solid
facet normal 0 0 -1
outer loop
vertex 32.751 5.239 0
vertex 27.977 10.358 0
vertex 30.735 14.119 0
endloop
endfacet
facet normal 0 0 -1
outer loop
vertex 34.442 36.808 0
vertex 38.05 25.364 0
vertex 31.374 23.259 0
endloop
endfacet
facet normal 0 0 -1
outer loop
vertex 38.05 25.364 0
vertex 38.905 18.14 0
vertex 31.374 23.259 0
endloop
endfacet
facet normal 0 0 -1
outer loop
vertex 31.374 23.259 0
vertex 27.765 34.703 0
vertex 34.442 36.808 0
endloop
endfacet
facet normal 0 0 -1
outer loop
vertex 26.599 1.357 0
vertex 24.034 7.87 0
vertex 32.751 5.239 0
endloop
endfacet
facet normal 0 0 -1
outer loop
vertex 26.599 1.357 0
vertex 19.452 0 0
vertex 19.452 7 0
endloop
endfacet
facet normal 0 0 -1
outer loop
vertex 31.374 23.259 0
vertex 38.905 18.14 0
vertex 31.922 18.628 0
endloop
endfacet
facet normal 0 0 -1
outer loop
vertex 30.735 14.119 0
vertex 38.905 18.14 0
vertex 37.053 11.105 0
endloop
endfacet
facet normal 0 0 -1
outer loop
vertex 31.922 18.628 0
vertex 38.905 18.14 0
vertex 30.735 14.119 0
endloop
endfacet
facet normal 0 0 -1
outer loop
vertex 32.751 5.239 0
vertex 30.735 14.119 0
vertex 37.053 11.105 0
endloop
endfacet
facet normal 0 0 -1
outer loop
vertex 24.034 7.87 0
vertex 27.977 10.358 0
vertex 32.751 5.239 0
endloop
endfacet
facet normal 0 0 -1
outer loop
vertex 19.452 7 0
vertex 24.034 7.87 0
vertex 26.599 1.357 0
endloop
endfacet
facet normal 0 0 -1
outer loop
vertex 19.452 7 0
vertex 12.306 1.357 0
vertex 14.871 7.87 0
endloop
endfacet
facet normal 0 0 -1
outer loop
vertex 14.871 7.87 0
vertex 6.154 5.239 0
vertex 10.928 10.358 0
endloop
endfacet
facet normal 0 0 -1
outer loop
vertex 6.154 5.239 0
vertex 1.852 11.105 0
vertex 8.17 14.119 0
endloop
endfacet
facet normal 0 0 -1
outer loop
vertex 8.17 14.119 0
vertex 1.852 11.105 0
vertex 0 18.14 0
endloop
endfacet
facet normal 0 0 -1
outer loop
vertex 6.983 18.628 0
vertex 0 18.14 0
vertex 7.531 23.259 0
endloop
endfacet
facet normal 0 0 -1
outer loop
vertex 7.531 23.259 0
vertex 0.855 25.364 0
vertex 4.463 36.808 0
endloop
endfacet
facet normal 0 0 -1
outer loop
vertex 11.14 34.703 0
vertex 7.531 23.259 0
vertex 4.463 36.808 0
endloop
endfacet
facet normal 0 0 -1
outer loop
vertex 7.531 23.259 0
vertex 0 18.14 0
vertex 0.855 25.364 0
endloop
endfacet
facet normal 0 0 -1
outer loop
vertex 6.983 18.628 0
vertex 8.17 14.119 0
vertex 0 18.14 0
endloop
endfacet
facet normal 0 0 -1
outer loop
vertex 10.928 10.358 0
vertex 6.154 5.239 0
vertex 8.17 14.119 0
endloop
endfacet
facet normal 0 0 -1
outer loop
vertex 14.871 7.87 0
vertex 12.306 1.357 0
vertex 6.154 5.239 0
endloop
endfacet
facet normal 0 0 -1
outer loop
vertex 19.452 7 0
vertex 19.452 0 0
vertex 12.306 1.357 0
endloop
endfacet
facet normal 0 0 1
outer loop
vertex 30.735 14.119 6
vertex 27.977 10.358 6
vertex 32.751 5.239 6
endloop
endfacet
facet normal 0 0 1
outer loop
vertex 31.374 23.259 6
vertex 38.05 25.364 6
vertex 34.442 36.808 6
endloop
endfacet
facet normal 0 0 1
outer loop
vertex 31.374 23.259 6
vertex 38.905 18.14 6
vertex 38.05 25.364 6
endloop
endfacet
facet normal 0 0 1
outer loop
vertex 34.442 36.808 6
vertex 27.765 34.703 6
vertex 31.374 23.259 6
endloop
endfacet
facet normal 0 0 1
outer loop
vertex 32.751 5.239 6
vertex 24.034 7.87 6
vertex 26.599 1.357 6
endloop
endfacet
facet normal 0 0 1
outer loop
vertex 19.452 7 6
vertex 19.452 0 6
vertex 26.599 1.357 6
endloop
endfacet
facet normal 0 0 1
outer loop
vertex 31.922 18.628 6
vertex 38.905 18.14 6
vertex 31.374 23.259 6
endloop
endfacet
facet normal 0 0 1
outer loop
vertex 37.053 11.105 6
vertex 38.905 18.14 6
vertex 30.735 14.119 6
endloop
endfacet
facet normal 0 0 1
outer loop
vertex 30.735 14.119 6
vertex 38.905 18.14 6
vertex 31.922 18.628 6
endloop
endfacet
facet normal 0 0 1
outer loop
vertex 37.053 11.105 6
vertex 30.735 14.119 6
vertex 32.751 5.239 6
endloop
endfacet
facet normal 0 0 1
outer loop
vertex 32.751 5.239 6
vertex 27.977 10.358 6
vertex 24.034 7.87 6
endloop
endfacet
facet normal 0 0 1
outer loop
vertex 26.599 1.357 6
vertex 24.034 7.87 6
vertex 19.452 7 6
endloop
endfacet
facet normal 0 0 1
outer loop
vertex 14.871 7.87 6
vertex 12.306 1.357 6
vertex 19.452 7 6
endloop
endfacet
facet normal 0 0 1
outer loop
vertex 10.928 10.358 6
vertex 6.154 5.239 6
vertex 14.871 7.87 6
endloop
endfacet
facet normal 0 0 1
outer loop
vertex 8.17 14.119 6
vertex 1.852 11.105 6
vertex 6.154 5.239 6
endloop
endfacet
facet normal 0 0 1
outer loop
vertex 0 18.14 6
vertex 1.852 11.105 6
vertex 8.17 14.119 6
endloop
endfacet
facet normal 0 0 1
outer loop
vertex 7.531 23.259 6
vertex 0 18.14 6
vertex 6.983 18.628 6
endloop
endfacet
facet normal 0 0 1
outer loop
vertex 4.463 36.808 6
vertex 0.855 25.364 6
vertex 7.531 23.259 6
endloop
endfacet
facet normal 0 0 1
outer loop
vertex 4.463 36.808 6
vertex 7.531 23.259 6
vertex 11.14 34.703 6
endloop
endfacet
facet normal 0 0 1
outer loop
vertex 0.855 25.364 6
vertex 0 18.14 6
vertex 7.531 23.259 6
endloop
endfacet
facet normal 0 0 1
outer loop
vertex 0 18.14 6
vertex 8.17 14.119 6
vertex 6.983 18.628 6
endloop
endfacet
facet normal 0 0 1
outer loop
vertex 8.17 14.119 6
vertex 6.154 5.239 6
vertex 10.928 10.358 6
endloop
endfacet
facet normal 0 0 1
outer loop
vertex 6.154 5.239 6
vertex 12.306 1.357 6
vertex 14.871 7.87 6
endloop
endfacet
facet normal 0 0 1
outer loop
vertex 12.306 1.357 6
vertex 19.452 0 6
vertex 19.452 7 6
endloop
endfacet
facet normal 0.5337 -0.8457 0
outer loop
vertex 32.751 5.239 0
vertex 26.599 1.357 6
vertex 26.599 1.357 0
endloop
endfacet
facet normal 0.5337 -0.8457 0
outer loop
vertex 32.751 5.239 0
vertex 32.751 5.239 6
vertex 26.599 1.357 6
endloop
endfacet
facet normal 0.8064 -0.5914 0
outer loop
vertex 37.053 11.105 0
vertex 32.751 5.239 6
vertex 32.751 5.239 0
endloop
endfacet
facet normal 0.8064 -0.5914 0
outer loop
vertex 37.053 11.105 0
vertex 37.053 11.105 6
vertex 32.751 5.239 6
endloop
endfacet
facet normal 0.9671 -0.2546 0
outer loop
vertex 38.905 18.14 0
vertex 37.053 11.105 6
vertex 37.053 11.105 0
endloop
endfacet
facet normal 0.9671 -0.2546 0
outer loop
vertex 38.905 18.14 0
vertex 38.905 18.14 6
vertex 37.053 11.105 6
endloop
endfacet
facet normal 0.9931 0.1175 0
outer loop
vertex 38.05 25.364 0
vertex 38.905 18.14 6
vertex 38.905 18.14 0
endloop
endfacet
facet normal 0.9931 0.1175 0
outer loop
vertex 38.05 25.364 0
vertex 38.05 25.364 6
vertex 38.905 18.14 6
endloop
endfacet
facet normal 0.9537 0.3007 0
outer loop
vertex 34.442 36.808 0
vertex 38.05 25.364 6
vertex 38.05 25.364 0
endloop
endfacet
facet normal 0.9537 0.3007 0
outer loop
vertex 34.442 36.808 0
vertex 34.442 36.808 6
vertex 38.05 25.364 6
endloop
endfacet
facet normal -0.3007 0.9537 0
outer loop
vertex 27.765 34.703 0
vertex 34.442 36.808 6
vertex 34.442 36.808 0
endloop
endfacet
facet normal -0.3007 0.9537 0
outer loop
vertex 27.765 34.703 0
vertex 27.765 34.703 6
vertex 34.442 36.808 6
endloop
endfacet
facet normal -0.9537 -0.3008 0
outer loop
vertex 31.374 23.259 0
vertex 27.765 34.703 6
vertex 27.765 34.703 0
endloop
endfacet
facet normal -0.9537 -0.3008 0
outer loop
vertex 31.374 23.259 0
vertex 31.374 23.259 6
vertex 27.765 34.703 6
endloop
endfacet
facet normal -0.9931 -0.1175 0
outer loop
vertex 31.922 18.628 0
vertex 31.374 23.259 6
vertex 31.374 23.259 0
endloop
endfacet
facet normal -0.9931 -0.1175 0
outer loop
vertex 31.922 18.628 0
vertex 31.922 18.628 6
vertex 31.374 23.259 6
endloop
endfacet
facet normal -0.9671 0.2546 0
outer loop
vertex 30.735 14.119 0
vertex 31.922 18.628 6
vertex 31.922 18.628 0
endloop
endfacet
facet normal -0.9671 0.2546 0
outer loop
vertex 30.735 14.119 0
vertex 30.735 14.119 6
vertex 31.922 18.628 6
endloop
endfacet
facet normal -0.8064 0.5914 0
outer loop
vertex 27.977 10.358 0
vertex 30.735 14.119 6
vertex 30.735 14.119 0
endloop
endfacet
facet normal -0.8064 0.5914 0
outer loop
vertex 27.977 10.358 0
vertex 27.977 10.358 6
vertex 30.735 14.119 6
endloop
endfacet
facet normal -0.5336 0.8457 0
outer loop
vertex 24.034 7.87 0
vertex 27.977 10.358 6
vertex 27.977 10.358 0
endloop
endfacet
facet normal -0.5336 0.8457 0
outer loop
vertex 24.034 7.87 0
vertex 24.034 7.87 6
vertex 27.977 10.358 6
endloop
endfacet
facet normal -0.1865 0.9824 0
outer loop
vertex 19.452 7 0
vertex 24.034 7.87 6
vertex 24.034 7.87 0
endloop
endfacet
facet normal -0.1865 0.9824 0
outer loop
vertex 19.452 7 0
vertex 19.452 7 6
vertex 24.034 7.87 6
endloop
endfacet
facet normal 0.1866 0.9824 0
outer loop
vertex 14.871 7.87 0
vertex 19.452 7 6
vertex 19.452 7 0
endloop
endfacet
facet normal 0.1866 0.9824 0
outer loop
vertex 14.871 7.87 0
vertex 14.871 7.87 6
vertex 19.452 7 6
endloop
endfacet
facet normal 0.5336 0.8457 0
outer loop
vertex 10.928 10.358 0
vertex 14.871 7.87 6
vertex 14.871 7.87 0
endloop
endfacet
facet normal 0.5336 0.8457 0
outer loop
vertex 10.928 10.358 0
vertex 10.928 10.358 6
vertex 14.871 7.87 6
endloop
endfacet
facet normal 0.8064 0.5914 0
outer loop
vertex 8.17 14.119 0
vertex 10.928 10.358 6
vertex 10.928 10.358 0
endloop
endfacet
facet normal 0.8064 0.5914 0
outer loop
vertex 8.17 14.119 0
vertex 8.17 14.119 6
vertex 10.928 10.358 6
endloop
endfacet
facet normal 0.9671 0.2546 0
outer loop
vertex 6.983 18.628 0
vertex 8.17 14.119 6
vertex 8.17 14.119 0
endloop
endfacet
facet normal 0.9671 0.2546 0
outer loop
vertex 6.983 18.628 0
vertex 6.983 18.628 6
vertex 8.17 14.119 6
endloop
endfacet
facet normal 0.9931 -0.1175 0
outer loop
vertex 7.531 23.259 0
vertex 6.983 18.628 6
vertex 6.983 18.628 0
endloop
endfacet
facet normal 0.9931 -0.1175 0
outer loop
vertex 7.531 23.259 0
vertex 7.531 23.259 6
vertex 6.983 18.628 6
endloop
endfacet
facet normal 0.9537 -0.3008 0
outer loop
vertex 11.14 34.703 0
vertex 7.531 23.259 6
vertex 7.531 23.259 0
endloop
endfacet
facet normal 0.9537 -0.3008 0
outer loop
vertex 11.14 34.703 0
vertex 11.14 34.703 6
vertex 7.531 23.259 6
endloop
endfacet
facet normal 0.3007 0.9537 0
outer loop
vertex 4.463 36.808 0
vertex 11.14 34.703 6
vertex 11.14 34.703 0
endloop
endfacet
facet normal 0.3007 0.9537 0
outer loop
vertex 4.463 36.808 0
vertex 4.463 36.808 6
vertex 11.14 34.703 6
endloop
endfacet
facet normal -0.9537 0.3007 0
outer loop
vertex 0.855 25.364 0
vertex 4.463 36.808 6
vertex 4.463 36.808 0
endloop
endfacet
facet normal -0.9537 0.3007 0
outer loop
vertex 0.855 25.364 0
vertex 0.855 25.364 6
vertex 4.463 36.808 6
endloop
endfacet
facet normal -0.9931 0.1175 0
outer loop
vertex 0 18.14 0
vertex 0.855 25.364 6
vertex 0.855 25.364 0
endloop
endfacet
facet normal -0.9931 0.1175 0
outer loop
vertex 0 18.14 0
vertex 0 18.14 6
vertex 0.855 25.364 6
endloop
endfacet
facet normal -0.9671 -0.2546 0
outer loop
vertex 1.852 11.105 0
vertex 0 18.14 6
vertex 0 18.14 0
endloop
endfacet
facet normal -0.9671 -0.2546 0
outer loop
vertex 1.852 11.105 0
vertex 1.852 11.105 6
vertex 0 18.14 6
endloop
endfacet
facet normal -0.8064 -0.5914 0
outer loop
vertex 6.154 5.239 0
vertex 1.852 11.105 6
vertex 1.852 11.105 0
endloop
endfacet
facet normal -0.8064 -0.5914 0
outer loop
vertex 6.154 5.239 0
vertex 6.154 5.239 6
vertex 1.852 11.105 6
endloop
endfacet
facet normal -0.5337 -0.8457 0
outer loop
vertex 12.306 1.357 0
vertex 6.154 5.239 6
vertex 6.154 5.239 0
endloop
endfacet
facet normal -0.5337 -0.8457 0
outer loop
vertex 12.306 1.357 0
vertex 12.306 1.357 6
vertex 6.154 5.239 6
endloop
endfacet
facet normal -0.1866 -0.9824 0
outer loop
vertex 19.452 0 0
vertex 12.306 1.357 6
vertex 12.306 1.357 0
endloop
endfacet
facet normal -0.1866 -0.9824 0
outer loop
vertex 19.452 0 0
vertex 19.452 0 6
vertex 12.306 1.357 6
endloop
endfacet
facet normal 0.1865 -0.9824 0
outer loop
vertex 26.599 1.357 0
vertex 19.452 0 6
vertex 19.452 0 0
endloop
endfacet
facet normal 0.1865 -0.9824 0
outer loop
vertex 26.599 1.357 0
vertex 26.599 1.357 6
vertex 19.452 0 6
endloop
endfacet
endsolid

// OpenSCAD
$fn = 32;

// ----------------------------------------------------------------------
// Clip blank: omega clip, 6 mm thick
// ----------------------------------------------------------------------

// --- parameters (mm) ---
profile_height = 6;       // extrusion height
profile_points = 26;      // points of the closed outline

profile = [[0.855, 25.364], [0, 18.14], [1.852, 11.105], [6.154, 5.239], [12.306, 1.357], [19.452, 0], [26.599, 1.357], [32.751, 5.239], [37.053, 11.105], [38.905, 18.14], [38.05, 25.364], [34.442, 36.808], [27.765, 34.703], [31.374, 23.259], [31.922, 18.628], [30.735, 14.119], [27.977, 10.358], [24.034, 7.87], [19.452, 7], [14.871, 7.87], [10.928, 10.358], [8.17, 14.119], [6.983, 18.628], [7.531, 23.259], [11.14, 34.703], [4.463, 36.808]];  // single closed polygon, 26 points, counter clockwise

// --- the one profile operation ---
linear_extrude(height = profile_height) polygon(points = profile);
